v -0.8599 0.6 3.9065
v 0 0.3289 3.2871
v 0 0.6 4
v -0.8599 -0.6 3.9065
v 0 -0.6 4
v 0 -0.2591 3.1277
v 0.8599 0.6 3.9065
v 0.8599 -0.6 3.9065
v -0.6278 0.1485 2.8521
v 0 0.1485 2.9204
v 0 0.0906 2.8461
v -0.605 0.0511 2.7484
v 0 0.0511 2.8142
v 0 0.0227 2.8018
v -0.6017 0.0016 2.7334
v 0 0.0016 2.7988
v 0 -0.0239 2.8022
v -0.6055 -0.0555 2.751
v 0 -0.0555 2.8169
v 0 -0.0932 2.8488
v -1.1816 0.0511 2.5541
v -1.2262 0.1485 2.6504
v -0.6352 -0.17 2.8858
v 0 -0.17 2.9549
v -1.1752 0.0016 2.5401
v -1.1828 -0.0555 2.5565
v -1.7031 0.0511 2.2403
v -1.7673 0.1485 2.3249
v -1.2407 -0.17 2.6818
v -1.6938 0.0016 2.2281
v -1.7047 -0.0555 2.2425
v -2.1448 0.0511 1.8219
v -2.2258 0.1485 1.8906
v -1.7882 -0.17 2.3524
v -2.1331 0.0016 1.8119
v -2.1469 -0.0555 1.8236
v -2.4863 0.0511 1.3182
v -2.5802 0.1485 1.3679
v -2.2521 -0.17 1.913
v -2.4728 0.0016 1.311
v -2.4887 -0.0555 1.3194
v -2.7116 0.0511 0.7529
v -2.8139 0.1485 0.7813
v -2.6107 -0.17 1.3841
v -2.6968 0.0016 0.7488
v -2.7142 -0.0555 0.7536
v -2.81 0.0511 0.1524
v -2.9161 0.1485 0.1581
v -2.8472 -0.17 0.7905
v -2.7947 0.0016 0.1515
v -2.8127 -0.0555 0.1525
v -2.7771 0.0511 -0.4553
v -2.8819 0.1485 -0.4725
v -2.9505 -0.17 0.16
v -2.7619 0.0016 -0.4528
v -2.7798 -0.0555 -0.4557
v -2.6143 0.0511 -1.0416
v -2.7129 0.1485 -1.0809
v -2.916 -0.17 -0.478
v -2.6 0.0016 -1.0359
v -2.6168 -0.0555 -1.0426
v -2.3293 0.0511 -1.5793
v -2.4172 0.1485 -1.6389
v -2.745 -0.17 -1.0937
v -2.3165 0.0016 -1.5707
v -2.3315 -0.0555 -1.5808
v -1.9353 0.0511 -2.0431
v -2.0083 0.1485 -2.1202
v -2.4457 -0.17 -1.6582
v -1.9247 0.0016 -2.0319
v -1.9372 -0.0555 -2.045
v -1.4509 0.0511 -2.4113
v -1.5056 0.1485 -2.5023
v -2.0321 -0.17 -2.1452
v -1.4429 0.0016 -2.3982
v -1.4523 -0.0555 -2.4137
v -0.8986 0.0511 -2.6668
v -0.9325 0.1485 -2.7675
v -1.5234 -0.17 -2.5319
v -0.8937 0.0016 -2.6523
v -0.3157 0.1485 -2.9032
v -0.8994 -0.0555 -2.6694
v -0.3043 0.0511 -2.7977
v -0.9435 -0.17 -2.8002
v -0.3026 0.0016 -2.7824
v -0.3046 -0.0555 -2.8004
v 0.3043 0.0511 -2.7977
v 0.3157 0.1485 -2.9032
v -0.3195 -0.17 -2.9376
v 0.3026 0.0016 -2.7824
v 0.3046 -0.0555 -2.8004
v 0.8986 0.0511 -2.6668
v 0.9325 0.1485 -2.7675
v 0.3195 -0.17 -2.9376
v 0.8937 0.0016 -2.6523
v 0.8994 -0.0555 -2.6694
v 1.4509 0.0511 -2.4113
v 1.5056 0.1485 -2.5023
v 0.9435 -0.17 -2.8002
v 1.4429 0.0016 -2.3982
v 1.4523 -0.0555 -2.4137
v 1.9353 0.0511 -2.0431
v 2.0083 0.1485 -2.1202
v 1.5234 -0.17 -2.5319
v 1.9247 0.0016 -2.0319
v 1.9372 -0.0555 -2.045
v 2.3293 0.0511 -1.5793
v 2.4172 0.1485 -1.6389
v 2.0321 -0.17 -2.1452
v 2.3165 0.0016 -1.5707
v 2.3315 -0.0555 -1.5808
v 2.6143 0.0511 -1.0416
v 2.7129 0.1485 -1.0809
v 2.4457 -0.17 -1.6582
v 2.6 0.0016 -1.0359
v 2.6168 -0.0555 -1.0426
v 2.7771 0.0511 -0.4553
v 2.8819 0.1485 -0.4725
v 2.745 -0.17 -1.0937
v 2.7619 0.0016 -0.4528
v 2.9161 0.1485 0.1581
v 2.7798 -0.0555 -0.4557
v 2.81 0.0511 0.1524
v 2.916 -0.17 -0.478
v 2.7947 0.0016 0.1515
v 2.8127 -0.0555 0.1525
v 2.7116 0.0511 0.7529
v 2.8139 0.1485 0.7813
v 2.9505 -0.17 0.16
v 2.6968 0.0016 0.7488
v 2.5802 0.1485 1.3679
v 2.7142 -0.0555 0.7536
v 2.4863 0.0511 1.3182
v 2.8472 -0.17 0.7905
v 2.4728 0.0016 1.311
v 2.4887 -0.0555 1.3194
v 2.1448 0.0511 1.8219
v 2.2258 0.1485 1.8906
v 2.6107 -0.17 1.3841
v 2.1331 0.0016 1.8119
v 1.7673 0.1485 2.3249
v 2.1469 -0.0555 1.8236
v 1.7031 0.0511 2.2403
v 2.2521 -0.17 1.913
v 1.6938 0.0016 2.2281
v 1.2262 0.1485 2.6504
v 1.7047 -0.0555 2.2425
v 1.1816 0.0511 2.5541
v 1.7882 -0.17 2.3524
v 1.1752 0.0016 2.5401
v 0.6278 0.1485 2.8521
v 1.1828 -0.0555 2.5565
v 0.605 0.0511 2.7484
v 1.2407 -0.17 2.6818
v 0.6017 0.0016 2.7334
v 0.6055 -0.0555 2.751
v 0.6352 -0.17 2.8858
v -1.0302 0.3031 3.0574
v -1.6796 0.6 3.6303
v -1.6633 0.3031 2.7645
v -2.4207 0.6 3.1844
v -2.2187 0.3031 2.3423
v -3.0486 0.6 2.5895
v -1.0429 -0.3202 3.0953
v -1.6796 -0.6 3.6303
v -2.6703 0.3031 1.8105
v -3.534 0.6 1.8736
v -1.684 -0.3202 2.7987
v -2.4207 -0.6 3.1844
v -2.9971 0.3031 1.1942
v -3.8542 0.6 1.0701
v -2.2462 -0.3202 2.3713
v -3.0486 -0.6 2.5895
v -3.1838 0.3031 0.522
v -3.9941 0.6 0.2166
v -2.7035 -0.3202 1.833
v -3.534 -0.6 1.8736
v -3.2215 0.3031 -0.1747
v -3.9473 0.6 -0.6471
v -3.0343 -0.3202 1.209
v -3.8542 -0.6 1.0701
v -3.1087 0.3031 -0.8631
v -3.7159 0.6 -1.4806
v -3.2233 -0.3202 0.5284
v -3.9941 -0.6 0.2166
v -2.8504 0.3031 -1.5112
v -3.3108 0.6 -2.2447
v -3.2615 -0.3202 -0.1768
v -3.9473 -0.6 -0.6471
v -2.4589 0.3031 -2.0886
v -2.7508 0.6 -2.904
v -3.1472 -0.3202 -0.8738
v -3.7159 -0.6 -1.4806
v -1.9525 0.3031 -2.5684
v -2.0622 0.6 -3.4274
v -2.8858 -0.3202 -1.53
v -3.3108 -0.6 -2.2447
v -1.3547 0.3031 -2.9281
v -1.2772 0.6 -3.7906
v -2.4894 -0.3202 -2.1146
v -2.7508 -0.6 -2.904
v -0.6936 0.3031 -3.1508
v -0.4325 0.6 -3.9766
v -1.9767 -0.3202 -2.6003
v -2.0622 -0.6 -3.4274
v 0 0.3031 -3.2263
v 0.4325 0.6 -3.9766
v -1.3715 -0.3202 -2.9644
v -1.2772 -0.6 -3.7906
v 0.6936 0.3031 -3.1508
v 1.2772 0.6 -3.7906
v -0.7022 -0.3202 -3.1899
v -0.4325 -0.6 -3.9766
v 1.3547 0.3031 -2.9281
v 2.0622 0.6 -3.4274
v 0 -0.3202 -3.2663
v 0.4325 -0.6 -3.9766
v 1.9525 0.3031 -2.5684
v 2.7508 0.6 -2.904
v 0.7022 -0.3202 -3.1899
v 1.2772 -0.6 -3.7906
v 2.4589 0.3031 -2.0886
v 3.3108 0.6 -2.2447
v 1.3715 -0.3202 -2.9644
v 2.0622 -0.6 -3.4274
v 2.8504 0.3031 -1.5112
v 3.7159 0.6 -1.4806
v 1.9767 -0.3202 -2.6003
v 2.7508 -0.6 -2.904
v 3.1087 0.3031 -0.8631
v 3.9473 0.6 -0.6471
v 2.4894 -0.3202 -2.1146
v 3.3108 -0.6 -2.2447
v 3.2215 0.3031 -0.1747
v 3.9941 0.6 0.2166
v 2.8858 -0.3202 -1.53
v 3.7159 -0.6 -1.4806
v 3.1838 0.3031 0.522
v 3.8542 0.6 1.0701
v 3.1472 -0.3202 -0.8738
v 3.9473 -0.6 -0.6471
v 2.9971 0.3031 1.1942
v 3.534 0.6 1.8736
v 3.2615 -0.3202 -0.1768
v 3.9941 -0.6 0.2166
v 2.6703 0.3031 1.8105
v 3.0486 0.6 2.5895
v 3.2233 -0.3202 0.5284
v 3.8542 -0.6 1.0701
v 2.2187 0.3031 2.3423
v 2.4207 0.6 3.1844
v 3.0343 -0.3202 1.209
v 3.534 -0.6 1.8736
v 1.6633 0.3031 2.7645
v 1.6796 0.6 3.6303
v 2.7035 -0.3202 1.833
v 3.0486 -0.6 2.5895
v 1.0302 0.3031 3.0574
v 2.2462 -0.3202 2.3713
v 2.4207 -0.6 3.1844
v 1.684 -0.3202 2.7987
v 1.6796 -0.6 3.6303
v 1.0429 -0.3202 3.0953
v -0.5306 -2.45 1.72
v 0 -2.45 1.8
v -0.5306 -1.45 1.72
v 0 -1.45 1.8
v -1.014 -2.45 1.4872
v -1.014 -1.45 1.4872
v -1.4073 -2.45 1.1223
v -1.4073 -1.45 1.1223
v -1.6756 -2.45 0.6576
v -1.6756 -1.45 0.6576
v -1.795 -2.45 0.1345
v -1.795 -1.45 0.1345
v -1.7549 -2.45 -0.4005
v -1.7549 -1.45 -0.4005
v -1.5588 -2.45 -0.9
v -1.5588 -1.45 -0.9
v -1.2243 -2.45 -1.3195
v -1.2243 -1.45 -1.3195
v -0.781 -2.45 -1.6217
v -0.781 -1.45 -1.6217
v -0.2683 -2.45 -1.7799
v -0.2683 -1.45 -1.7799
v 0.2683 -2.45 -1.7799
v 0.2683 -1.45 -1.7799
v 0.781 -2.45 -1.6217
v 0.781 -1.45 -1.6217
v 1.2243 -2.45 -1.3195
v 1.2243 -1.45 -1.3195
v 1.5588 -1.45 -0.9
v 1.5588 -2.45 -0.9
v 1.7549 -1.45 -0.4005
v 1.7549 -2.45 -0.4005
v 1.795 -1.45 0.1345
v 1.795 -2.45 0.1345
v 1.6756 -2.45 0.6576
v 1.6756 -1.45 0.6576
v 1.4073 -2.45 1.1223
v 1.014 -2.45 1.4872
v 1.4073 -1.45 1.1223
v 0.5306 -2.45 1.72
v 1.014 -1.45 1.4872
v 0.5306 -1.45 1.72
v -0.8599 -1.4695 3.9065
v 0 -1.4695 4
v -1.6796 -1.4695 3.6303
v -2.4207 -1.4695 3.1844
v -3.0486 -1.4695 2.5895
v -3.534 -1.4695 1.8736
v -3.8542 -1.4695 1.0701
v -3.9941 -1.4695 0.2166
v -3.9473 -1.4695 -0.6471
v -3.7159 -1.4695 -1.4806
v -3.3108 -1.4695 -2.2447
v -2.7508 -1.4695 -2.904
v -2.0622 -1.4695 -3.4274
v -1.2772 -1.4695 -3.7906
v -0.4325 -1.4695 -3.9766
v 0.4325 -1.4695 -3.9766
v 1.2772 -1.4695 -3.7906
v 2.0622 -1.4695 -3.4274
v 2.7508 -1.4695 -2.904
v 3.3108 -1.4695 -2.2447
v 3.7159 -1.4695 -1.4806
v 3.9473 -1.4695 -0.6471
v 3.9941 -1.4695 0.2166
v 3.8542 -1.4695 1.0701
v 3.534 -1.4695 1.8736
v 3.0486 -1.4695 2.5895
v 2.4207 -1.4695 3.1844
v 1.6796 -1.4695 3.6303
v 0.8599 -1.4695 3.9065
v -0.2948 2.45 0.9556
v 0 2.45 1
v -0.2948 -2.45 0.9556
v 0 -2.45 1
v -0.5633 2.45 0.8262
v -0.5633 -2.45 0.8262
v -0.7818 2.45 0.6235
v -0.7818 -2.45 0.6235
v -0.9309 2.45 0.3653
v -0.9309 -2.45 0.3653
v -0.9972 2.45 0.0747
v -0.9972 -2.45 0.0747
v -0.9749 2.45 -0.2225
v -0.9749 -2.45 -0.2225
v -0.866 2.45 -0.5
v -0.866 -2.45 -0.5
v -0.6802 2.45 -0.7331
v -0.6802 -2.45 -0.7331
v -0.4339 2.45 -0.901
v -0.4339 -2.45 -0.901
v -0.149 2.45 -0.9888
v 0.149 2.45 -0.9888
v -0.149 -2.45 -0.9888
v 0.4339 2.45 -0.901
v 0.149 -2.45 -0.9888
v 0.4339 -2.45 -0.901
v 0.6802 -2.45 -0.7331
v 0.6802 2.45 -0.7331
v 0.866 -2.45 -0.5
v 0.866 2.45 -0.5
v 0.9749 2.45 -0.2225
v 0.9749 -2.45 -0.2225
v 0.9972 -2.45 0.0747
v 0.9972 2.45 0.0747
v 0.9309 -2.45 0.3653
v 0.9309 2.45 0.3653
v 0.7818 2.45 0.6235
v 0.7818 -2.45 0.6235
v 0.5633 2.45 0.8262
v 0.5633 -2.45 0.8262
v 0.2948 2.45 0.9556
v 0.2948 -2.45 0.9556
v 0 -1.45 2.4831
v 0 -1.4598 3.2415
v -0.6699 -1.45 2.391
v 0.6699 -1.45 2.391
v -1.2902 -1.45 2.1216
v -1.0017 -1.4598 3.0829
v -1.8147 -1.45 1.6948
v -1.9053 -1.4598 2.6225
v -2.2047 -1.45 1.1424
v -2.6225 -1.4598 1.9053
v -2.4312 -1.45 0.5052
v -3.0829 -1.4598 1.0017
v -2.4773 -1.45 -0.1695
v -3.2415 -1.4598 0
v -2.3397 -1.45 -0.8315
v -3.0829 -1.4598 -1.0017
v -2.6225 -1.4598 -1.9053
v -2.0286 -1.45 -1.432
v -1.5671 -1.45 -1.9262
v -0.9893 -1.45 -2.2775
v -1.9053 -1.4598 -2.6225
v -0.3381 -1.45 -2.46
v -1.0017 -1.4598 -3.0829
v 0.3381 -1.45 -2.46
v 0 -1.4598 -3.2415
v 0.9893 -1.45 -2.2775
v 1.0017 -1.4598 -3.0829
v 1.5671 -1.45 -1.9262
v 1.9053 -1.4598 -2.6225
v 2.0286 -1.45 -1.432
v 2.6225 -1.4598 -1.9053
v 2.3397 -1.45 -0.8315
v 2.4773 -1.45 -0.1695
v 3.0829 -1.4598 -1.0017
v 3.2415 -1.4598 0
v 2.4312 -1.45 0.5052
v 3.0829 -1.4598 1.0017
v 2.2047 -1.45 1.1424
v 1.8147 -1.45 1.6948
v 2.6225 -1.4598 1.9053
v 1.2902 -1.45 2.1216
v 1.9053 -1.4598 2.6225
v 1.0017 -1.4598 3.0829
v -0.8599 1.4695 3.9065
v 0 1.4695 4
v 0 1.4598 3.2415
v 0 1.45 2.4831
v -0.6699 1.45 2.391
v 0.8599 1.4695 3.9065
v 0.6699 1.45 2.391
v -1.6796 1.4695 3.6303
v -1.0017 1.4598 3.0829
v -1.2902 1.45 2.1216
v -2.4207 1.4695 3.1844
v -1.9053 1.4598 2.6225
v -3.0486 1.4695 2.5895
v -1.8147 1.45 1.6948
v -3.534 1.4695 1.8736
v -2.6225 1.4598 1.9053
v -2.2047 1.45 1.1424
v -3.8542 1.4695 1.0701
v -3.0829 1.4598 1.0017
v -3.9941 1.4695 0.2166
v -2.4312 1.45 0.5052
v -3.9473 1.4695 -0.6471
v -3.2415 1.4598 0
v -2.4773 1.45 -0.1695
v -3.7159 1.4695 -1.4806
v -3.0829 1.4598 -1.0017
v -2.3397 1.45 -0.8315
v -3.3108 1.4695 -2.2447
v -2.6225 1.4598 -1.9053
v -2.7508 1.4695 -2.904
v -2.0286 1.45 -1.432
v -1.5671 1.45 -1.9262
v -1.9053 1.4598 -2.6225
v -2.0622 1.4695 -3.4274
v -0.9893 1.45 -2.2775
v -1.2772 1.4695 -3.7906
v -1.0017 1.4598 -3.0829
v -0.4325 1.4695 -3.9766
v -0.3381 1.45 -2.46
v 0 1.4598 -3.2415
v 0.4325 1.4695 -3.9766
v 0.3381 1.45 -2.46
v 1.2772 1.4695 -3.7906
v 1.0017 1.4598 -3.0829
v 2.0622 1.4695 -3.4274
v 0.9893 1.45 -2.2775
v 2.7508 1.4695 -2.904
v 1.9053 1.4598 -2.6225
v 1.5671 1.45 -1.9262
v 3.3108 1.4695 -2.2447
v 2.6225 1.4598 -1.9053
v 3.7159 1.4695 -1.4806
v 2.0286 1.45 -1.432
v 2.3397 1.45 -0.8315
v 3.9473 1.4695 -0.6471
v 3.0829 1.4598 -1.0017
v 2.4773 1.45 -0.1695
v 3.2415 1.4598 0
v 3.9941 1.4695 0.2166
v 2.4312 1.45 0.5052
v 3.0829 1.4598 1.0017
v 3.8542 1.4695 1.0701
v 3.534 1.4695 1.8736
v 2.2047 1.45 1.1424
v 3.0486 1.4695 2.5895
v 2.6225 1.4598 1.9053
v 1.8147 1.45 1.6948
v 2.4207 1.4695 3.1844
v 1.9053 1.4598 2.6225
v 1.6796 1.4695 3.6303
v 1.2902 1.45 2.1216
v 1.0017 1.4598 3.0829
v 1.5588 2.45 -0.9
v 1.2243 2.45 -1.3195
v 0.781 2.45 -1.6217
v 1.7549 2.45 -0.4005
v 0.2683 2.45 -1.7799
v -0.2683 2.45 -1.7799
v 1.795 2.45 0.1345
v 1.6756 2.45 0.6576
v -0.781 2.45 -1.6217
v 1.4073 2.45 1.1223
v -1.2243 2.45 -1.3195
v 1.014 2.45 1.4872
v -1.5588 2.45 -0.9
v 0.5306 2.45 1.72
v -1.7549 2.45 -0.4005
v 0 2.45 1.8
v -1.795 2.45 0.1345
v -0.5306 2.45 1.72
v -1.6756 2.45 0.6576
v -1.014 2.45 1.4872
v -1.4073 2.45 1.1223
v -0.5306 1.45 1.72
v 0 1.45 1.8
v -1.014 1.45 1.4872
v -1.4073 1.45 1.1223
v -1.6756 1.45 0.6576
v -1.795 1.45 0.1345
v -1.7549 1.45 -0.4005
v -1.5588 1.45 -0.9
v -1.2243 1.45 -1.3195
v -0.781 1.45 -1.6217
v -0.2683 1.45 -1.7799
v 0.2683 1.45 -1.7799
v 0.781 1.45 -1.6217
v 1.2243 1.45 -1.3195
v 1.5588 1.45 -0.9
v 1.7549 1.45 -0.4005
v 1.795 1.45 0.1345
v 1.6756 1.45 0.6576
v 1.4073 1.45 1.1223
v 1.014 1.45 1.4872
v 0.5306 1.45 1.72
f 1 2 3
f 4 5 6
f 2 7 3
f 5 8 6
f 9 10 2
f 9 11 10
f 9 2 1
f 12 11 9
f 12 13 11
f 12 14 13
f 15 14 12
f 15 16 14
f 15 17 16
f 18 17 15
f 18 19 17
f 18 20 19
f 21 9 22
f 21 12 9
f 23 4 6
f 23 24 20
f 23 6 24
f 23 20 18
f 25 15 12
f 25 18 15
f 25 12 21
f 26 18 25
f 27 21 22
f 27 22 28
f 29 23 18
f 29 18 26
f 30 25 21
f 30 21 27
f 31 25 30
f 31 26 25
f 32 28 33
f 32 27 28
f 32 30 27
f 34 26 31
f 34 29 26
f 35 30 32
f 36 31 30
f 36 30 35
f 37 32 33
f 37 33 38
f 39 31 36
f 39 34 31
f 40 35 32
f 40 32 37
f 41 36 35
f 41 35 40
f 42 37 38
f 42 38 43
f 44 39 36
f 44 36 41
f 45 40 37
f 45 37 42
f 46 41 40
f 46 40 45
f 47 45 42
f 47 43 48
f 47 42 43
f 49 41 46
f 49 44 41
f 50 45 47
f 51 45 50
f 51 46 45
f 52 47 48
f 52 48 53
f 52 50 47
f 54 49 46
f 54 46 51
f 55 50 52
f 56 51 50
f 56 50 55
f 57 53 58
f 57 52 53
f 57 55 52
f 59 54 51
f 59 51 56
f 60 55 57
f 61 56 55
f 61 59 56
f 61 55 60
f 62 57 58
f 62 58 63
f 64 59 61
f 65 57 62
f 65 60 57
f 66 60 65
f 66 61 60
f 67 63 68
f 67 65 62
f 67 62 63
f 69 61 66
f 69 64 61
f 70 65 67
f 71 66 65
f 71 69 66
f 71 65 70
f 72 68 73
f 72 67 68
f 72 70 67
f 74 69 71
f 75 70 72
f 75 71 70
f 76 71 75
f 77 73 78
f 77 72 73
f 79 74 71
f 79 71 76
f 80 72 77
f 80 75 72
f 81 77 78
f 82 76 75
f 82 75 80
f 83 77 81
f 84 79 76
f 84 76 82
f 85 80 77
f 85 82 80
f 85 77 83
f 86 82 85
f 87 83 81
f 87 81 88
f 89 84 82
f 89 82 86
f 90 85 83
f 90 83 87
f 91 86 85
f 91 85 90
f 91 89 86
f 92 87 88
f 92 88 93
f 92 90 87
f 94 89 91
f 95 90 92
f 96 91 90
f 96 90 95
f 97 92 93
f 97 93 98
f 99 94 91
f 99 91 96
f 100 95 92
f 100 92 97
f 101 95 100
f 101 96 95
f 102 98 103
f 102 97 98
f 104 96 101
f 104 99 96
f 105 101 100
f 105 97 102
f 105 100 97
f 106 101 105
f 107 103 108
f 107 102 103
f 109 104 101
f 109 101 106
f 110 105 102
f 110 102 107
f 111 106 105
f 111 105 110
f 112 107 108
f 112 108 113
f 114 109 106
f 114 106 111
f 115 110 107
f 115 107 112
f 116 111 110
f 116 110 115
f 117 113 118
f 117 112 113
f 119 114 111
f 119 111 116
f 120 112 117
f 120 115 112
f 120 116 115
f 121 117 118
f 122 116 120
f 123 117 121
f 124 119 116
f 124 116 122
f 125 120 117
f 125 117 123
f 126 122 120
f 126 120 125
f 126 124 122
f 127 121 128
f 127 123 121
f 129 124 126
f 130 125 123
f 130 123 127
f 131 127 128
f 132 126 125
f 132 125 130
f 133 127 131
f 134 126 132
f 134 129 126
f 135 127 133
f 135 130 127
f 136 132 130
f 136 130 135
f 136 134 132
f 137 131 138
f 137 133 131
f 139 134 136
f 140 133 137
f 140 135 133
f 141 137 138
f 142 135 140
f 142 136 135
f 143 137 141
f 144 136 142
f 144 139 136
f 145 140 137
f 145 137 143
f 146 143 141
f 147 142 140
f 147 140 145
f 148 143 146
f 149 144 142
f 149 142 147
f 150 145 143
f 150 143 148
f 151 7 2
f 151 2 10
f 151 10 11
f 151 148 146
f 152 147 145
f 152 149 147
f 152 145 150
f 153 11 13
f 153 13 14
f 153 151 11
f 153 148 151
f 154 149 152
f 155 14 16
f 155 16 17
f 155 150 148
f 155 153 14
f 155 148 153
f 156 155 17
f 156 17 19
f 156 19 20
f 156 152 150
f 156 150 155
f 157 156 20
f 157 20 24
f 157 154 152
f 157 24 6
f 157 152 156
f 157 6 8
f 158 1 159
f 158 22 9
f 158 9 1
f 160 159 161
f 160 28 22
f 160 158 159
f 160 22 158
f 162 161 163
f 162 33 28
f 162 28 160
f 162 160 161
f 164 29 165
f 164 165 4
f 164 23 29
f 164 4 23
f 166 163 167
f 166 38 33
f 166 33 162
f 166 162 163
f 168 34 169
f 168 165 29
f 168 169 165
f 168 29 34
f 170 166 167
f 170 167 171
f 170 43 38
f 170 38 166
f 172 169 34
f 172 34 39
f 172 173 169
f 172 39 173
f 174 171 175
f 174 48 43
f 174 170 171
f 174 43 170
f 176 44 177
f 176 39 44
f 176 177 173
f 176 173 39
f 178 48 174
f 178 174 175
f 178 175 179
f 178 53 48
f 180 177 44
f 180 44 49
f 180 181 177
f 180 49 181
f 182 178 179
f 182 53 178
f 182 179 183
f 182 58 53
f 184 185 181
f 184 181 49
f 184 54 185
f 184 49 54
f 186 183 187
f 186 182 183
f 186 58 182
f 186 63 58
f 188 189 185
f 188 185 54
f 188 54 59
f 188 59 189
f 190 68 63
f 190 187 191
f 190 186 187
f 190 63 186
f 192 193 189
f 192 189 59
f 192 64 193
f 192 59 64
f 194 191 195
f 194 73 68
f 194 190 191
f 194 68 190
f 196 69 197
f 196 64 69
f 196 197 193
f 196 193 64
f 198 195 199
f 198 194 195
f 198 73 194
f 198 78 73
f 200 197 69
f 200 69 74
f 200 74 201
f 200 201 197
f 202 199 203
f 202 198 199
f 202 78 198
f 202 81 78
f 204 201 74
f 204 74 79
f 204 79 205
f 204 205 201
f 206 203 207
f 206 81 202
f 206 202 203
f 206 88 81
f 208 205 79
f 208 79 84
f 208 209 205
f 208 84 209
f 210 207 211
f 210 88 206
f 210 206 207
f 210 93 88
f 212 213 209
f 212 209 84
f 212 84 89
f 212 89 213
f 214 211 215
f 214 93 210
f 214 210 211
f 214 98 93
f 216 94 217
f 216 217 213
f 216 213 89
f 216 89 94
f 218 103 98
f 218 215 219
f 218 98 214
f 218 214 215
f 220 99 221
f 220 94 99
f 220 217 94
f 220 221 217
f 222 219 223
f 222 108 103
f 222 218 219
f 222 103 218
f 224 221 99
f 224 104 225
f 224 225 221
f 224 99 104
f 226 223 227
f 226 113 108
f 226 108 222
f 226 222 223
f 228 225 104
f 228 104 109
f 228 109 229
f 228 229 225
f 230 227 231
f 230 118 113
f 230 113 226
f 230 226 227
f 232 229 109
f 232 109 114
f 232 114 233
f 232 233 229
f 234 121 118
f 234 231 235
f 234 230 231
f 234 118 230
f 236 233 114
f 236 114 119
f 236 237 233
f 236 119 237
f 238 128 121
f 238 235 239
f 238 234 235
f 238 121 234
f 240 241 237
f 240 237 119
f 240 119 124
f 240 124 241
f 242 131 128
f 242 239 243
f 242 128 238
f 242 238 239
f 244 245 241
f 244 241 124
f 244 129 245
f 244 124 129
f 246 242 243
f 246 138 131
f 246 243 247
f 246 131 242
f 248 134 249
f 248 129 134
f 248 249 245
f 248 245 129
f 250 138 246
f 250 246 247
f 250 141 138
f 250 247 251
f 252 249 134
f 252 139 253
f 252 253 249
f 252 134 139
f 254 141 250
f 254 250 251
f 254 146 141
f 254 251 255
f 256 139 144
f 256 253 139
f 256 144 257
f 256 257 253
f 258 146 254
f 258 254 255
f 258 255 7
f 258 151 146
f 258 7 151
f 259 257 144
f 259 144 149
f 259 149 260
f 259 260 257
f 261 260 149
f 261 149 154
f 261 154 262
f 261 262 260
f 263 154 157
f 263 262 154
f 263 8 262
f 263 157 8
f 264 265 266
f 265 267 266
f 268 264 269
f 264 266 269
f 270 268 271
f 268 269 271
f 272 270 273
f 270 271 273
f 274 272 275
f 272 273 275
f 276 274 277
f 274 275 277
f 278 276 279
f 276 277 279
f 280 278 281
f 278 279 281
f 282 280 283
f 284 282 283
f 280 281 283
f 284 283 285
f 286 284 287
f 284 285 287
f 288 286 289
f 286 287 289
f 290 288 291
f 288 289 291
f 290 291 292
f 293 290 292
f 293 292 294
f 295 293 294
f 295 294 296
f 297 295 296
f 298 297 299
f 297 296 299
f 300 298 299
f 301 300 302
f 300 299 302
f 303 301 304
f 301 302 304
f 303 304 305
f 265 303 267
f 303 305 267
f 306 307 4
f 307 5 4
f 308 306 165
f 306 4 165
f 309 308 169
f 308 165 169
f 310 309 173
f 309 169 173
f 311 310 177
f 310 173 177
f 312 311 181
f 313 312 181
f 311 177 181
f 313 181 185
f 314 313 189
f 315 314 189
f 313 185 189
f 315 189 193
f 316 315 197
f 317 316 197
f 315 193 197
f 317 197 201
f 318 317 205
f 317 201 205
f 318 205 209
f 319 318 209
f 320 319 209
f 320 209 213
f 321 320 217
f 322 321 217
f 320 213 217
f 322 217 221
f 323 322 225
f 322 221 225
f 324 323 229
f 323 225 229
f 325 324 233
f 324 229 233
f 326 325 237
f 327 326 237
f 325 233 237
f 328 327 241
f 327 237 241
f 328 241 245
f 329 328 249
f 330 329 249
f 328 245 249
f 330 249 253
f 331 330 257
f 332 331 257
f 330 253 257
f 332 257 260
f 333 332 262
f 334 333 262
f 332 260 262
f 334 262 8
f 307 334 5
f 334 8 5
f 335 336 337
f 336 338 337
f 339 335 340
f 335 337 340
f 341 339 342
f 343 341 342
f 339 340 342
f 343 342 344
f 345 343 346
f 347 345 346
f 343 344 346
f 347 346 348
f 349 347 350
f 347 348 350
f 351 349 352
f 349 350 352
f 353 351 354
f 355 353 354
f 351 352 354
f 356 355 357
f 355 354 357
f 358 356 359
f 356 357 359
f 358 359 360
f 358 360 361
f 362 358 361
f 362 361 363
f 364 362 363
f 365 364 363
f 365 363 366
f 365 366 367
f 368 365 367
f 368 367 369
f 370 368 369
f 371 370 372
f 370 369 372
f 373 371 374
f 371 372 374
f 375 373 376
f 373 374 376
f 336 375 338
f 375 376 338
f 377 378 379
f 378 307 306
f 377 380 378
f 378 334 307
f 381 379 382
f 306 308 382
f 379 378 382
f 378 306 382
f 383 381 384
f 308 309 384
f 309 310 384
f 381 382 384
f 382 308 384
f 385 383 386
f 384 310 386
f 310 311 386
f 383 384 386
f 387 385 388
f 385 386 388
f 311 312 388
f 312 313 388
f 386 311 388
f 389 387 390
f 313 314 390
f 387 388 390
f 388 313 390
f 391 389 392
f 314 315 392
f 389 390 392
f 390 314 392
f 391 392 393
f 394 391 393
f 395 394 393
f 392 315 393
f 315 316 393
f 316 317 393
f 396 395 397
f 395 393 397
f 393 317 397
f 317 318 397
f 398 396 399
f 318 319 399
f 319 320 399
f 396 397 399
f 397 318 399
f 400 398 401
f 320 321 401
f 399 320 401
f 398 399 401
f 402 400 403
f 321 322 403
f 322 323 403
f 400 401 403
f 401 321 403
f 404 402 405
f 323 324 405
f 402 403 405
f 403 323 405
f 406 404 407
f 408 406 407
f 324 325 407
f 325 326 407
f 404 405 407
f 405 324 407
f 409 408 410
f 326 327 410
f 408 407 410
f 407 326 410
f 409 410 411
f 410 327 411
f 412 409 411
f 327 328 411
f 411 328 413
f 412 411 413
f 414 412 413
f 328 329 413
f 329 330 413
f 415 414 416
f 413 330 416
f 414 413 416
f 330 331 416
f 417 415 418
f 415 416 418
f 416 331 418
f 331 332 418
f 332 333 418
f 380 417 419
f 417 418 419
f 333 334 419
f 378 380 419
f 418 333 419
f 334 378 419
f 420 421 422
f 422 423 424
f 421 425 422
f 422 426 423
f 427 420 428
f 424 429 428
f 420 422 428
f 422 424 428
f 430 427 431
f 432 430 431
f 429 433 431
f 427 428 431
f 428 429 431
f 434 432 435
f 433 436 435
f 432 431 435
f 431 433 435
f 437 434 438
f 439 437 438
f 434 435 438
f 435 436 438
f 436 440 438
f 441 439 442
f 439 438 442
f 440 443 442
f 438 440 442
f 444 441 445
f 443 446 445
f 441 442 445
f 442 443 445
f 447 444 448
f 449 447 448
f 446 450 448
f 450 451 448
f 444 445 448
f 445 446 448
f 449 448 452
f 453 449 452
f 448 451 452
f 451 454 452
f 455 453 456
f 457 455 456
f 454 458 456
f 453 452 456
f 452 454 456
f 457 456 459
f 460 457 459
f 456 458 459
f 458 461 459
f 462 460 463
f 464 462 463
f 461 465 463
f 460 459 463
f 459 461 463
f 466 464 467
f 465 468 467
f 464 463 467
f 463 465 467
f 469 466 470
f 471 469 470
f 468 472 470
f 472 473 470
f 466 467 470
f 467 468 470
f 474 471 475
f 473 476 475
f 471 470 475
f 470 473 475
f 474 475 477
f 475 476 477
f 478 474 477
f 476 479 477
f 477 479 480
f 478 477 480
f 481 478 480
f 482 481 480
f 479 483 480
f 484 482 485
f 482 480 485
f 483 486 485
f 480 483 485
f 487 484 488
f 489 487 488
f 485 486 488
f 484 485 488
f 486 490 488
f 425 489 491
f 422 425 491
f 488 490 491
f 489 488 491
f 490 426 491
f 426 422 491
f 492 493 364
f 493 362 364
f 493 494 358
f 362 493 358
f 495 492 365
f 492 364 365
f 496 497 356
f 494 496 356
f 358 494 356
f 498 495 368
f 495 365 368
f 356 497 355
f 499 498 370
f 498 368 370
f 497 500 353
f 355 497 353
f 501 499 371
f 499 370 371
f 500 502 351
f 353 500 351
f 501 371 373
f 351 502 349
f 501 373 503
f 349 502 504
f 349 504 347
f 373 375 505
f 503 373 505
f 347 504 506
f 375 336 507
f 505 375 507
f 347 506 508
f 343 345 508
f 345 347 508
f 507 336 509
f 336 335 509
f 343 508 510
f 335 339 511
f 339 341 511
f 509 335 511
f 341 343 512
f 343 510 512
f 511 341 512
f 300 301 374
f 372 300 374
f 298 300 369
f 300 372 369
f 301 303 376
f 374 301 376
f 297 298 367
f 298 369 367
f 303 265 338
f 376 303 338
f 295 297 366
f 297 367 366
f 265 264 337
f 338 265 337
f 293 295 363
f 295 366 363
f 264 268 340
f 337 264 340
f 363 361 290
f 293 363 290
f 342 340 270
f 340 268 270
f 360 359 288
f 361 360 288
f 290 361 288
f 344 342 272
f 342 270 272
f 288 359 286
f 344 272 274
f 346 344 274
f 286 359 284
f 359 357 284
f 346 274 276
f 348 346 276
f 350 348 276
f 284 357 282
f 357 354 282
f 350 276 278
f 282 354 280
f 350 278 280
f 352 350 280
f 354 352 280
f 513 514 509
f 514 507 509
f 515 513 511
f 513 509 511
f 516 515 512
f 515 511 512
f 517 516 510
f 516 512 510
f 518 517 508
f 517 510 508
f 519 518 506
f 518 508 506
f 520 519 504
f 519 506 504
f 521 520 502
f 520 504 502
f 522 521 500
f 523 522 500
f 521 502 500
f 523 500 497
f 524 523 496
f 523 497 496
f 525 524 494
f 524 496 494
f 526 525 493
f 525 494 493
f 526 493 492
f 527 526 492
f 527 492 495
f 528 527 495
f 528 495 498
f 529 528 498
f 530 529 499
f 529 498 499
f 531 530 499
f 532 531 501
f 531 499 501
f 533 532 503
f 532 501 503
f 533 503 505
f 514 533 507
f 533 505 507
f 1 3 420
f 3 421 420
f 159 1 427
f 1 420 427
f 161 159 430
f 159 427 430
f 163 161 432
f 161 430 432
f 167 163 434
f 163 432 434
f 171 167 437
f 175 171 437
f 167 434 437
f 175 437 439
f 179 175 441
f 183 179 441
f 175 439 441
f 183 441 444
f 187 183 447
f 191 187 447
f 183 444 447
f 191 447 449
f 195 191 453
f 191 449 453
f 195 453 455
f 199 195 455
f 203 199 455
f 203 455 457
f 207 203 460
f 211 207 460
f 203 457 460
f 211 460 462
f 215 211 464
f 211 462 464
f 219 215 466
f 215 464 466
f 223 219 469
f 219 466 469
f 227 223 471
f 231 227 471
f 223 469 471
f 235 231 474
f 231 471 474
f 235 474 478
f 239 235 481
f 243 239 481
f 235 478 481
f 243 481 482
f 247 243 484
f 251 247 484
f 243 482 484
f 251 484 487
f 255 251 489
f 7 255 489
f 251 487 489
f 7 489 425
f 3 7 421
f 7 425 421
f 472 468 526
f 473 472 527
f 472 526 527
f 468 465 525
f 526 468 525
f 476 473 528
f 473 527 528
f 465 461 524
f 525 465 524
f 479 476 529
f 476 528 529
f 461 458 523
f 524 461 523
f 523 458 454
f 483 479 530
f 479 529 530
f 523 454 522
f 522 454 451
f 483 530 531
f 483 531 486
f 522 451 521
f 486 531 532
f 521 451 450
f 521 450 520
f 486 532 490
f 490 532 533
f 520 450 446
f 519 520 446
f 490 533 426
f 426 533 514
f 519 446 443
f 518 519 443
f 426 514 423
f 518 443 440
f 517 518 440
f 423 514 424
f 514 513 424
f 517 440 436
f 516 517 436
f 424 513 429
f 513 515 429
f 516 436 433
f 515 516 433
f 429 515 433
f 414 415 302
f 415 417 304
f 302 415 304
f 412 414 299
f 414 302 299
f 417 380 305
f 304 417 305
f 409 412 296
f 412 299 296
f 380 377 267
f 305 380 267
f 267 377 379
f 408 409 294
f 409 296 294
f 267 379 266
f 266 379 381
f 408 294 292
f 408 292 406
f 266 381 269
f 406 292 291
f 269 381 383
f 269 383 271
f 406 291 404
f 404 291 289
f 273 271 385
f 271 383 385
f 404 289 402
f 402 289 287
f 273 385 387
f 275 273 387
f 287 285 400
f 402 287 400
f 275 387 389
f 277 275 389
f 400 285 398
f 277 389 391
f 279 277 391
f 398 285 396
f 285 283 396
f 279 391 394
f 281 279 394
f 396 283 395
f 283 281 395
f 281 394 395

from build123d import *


with BuildPart() as part:
    # 草图1 → 旋转9 (revolve)
    with BuildSketch(Plane.XY, mode=Mode.PRIVATE) as revolve_9_sk:
        with BuildLine():
            Line((1.8, -1.45), (2.483096715, -1.45))
            Line((2.483096715, -1.45), (4, -1.469540433))
            Line((4, -1.469540433), (4, -0.6))
            add(Edge.make_bspline(
                [(4, 0.6), (2.330711219, 0), (4, -0.6)],
                knots=[0, 0, 0, 1, 1, 1], degree=2, weights=[1, 2.566282575, 1]))
            Line((4, 0.6), (4, 1.469540433))
            Line((4, 1.469540433), (2.483096715, 1.45))
            Line((2.483096715, 1.45), (1.8, 1.45))
            Line((1.8, 1.45), (1.8, 2.45))
            Line((1.8, 2.45), (1, 2.45))
            Line((1, 2.45), (1, -2.45))
            Line((1, -2.45), (1.8, -2.45))
            Line((1.8, -2.45), (1.8, -1.45))
        make_face()
    revolve(revolve_9_sk.sketch.rotate(Axis((0, 2.07863921, 0), (0, -1, 0)), 90), axis=Axis((0, 2.07863921, 0), (0, -1, 0)))


solid = part.part
